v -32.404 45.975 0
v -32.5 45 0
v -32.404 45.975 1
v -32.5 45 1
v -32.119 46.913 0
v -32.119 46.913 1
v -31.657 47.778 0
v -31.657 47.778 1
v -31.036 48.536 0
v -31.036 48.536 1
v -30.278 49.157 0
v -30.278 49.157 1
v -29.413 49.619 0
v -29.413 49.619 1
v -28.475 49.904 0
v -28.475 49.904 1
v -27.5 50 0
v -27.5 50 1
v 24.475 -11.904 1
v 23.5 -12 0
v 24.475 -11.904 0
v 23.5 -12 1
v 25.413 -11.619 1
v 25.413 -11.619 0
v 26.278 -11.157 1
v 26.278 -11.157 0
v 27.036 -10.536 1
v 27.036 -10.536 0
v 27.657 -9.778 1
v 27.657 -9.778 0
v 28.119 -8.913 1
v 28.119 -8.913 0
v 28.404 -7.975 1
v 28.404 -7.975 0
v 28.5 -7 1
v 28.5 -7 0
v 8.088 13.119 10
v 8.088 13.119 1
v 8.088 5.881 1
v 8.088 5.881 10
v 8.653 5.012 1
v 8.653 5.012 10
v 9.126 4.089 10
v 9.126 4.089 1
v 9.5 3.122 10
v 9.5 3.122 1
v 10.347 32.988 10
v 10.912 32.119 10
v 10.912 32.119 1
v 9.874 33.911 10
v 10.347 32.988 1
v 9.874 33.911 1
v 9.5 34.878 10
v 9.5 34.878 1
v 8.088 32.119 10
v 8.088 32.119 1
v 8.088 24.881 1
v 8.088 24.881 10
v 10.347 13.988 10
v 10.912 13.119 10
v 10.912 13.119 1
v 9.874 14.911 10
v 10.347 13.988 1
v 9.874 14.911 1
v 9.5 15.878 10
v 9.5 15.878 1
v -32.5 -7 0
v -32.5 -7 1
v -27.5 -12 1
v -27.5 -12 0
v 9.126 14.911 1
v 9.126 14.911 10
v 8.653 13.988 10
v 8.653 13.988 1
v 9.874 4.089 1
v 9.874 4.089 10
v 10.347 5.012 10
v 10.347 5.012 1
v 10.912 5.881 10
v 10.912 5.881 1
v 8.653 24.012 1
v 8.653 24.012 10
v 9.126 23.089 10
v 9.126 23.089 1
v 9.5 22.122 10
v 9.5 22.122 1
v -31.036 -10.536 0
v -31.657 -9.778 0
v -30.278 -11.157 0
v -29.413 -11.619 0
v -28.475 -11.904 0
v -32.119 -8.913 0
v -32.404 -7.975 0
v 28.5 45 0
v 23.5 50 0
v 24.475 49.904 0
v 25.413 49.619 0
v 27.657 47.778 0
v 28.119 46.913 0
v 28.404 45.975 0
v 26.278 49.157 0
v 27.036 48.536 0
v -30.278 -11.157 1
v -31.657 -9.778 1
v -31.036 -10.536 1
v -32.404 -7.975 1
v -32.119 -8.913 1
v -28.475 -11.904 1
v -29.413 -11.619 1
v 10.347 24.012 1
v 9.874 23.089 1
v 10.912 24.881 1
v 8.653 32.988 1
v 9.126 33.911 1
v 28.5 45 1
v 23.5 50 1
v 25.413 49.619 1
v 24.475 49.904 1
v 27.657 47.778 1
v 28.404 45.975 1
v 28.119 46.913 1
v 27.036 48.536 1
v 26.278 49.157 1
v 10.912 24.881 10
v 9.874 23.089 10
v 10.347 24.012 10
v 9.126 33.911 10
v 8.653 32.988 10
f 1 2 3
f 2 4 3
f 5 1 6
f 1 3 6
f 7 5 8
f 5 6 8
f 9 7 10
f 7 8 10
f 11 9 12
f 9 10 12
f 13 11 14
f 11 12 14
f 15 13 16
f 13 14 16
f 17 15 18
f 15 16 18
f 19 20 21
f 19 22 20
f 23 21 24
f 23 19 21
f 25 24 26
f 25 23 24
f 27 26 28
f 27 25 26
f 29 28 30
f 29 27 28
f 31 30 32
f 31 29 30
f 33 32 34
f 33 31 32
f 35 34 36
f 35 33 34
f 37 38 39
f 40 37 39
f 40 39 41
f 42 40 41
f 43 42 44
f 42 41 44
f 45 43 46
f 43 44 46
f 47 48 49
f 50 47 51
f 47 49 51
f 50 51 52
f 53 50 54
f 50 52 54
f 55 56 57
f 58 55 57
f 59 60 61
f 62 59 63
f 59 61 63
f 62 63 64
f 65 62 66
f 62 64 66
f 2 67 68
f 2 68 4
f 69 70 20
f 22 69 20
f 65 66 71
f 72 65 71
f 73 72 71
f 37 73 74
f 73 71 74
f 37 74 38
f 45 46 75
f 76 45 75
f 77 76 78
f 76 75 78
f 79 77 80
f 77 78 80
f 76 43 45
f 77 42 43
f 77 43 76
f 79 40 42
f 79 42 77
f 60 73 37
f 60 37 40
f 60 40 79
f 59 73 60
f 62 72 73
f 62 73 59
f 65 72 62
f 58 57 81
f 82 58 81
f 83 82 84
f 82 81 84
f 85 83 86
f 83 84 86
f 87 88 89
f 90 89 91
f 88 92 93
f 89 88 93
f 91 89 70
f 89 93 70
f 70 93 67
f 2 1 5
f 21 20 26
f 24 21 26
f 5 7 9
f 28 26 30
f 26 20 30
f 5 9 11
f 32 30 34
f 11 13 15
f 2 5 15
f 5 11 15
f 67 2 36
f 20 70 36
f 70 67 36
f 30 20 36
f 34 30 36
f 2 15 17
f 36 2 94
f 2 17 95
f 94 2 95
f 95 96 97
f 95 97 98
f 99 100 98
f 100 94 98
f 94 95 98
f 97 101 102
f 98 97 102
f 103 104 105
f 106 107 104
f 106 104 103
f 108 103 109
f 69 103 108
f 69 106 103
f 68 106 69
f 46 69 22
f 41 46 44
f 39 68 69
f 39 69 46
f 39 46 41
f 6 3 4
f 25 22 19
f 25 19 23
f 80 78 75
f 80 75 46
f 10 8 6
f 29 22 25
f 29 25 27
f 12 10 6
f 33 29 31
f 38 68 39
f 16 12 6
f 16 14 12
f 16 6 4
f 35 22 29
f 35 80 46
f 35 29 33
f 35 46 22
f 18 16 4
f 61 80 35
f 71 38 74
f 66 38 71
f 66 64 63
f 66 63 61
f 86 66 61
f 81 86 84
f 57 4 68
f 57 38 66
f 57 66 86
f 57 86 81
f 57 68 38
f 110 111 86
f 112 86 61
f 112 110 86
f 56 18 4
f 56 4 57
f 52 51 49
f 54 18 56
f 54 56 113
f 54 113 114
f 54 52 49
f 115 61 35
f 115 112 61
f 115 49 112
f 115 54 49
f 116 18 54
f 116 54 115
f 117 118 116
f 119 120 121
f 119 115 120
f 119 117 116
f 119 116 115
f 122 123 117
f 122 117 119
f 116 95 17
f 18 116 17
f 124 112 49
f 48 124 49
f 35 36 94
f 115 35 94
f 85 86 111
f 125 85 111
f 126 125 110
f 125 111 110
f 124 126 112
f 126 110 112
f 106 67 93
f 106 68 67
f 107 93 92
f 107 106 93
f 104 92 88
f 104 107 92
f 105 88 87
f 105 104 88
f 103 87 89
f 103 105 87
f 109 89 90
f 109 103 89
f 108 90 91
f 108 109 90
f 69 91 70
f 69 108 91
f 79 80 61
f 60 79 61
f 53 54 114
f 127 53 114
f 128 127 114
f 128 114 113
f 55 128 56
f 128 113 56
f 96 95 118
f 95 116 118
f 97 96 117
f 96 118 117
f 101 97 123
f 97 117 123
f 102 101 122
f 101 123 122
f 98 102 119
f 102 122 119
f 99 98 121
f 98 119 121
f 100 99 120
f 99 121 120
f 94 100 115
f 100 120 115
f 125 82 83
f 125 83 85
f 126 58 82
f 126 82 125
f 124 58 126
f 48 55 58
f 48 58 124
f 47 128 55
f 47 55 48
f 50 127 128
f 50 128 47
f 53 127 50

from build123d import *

# Parameters (mm, degrees)
F0_W     = 23
F0_H     = 62
F0_W_2   = 38
F1_DEPTH = 1
F2_DEPTH = 10
F3_R     = 5


# Not quite as in the source:
# - a feature names something its author has since deleted; it is built from what else it names


with BuildPart() as f1:
    # F0 (on Top) → F1 (new body)
    with BuildSketch(Plane.XY):
        with Locations((-21, 19)):
            Rectangle(F0_W, F0_H)
        with Locations((9.5, 19)):
            Rectangle(F0_W_2, F0_H)
        with BuildLine():
            ThreePointArc((9.5, 15.8775010008), (10.0985618966, 14.4432029131), (10.9121369044, 13.1189736826))
            Line((10.9121369044, 13.1189736826), (10.9121369044, 5.8810263174))
            ThreePointArc((10.9121369044, 5.8810263174), (10.0985618966, 4.5567970869), (9.5, 3.1224989992))
            ThreePointArc((9.5, 3.1224989992), (8.9014381034, 4.5567970869), (8.0878630956, 5.8810263174))
            Line((8.0878630956, 5.8810263174), (8.0878630956, 13.1189736826))
            ThreePointArc((8.0878630956, 13.1189736826), (8.9014381034, 14.4432029131), (9.5, 15.8775010008))
        make_face(mode=Mode.SUBTRACT)
        with BuildLine():
            Line((8.0878630956, 24.8810263174), (8.0878630956, 32.1189736826))
            ThreePointArc((8.0878630956, 32.1189736826), (8.9014381034, 33.4432029131), (9.5, 34.8775010008))
            ThreePointArc((9.5, 34.8775010008), (10.0985618966, 33.4432029131), (10.9121369044, 32.1189736826))
            Line((10.9121369044, 32.1189736826), (10.9121369044, 24.8810263174))
            ThreePointArc((10.9121369044, 24.8810263174), (10.0985618966, 23.5567970869), (9.5, 22.1224989992))
            ThreePointArc((9.5, 22.1224989992), (8.9014381034, 23.5567970869), (8.0878630956, 24.8810263174))
        make_face(mode=Mode.SUBTRACT)
    extrude(amount=F1_DEPTH)

    # F0 (on Top) → F2 (join)
    with BuildSketch(Plane.XY):
        with BuildLine():
            ThreePointArc((9.5, 34.8775010008), (8.9014381034, 33.4432029131), (8.0878630956, 32.1189736826))
            Line((8.0878630956, 32.1189736826), (8.0878630956, 24.8810263174))
            ThreePointArc((8.0878630956, 24.8810263174), (8.9014381034, 23.5567970869), (9.5, 22.1224989992))
            ThreePointArc((9.5, 22.1224989992), (10.0985618966, 23.5567970869), (10.9121369044, 24.8810263174))
            Line((10.9121369044, 24.8810263174), (10.9121369044, 32.1189736826))
            ThreePointArc((10.9121369044, 32.1189736826), (10.0985618966, 33.4432029131), (9.5, 34.8775010008))
        make_face()
        with BuildLine():
            Line((10.9121369044, 5.8810263174), (10.9121369044, 13.1189736826))
            ThreePointArc((10.9121369044, 13.1189736826), (10.0985618966, 14.4432029131), (9.5, 15.8775010008))
            ThreePointArc((9.5, 15.8775010008), (8.9014381034, 14.4432029131), (8.0878630956, 13.1189736826))
            Line((8.0878630956, 13.1189736826), (8.0878630956, 5.8810263174))
            ThreePointArc((8.0878630956, 5.8810263174), (8.9014381034, 4.5567970869), (9.5, 3.1224989992))
            ThreePointArc((9.5, 3.1224989992), (10.0985618966, 4.5567970869), (10.9121369044, 5.8810263174))
        make_face()
    extrude(amount=F2_DEPTH)

    # F3
    f3_edges = [f1.edges().sort_by_distance(p)[0] for p in [
        (-32.5, 50, 0.5),
        (28.5, 50, 0.5),
        (28.5, -12, 0.5),
        (-32.5, -12, 0.5),
    ]]
    fillet(f3_edges, radius=F3_R)


solid = f1.part
